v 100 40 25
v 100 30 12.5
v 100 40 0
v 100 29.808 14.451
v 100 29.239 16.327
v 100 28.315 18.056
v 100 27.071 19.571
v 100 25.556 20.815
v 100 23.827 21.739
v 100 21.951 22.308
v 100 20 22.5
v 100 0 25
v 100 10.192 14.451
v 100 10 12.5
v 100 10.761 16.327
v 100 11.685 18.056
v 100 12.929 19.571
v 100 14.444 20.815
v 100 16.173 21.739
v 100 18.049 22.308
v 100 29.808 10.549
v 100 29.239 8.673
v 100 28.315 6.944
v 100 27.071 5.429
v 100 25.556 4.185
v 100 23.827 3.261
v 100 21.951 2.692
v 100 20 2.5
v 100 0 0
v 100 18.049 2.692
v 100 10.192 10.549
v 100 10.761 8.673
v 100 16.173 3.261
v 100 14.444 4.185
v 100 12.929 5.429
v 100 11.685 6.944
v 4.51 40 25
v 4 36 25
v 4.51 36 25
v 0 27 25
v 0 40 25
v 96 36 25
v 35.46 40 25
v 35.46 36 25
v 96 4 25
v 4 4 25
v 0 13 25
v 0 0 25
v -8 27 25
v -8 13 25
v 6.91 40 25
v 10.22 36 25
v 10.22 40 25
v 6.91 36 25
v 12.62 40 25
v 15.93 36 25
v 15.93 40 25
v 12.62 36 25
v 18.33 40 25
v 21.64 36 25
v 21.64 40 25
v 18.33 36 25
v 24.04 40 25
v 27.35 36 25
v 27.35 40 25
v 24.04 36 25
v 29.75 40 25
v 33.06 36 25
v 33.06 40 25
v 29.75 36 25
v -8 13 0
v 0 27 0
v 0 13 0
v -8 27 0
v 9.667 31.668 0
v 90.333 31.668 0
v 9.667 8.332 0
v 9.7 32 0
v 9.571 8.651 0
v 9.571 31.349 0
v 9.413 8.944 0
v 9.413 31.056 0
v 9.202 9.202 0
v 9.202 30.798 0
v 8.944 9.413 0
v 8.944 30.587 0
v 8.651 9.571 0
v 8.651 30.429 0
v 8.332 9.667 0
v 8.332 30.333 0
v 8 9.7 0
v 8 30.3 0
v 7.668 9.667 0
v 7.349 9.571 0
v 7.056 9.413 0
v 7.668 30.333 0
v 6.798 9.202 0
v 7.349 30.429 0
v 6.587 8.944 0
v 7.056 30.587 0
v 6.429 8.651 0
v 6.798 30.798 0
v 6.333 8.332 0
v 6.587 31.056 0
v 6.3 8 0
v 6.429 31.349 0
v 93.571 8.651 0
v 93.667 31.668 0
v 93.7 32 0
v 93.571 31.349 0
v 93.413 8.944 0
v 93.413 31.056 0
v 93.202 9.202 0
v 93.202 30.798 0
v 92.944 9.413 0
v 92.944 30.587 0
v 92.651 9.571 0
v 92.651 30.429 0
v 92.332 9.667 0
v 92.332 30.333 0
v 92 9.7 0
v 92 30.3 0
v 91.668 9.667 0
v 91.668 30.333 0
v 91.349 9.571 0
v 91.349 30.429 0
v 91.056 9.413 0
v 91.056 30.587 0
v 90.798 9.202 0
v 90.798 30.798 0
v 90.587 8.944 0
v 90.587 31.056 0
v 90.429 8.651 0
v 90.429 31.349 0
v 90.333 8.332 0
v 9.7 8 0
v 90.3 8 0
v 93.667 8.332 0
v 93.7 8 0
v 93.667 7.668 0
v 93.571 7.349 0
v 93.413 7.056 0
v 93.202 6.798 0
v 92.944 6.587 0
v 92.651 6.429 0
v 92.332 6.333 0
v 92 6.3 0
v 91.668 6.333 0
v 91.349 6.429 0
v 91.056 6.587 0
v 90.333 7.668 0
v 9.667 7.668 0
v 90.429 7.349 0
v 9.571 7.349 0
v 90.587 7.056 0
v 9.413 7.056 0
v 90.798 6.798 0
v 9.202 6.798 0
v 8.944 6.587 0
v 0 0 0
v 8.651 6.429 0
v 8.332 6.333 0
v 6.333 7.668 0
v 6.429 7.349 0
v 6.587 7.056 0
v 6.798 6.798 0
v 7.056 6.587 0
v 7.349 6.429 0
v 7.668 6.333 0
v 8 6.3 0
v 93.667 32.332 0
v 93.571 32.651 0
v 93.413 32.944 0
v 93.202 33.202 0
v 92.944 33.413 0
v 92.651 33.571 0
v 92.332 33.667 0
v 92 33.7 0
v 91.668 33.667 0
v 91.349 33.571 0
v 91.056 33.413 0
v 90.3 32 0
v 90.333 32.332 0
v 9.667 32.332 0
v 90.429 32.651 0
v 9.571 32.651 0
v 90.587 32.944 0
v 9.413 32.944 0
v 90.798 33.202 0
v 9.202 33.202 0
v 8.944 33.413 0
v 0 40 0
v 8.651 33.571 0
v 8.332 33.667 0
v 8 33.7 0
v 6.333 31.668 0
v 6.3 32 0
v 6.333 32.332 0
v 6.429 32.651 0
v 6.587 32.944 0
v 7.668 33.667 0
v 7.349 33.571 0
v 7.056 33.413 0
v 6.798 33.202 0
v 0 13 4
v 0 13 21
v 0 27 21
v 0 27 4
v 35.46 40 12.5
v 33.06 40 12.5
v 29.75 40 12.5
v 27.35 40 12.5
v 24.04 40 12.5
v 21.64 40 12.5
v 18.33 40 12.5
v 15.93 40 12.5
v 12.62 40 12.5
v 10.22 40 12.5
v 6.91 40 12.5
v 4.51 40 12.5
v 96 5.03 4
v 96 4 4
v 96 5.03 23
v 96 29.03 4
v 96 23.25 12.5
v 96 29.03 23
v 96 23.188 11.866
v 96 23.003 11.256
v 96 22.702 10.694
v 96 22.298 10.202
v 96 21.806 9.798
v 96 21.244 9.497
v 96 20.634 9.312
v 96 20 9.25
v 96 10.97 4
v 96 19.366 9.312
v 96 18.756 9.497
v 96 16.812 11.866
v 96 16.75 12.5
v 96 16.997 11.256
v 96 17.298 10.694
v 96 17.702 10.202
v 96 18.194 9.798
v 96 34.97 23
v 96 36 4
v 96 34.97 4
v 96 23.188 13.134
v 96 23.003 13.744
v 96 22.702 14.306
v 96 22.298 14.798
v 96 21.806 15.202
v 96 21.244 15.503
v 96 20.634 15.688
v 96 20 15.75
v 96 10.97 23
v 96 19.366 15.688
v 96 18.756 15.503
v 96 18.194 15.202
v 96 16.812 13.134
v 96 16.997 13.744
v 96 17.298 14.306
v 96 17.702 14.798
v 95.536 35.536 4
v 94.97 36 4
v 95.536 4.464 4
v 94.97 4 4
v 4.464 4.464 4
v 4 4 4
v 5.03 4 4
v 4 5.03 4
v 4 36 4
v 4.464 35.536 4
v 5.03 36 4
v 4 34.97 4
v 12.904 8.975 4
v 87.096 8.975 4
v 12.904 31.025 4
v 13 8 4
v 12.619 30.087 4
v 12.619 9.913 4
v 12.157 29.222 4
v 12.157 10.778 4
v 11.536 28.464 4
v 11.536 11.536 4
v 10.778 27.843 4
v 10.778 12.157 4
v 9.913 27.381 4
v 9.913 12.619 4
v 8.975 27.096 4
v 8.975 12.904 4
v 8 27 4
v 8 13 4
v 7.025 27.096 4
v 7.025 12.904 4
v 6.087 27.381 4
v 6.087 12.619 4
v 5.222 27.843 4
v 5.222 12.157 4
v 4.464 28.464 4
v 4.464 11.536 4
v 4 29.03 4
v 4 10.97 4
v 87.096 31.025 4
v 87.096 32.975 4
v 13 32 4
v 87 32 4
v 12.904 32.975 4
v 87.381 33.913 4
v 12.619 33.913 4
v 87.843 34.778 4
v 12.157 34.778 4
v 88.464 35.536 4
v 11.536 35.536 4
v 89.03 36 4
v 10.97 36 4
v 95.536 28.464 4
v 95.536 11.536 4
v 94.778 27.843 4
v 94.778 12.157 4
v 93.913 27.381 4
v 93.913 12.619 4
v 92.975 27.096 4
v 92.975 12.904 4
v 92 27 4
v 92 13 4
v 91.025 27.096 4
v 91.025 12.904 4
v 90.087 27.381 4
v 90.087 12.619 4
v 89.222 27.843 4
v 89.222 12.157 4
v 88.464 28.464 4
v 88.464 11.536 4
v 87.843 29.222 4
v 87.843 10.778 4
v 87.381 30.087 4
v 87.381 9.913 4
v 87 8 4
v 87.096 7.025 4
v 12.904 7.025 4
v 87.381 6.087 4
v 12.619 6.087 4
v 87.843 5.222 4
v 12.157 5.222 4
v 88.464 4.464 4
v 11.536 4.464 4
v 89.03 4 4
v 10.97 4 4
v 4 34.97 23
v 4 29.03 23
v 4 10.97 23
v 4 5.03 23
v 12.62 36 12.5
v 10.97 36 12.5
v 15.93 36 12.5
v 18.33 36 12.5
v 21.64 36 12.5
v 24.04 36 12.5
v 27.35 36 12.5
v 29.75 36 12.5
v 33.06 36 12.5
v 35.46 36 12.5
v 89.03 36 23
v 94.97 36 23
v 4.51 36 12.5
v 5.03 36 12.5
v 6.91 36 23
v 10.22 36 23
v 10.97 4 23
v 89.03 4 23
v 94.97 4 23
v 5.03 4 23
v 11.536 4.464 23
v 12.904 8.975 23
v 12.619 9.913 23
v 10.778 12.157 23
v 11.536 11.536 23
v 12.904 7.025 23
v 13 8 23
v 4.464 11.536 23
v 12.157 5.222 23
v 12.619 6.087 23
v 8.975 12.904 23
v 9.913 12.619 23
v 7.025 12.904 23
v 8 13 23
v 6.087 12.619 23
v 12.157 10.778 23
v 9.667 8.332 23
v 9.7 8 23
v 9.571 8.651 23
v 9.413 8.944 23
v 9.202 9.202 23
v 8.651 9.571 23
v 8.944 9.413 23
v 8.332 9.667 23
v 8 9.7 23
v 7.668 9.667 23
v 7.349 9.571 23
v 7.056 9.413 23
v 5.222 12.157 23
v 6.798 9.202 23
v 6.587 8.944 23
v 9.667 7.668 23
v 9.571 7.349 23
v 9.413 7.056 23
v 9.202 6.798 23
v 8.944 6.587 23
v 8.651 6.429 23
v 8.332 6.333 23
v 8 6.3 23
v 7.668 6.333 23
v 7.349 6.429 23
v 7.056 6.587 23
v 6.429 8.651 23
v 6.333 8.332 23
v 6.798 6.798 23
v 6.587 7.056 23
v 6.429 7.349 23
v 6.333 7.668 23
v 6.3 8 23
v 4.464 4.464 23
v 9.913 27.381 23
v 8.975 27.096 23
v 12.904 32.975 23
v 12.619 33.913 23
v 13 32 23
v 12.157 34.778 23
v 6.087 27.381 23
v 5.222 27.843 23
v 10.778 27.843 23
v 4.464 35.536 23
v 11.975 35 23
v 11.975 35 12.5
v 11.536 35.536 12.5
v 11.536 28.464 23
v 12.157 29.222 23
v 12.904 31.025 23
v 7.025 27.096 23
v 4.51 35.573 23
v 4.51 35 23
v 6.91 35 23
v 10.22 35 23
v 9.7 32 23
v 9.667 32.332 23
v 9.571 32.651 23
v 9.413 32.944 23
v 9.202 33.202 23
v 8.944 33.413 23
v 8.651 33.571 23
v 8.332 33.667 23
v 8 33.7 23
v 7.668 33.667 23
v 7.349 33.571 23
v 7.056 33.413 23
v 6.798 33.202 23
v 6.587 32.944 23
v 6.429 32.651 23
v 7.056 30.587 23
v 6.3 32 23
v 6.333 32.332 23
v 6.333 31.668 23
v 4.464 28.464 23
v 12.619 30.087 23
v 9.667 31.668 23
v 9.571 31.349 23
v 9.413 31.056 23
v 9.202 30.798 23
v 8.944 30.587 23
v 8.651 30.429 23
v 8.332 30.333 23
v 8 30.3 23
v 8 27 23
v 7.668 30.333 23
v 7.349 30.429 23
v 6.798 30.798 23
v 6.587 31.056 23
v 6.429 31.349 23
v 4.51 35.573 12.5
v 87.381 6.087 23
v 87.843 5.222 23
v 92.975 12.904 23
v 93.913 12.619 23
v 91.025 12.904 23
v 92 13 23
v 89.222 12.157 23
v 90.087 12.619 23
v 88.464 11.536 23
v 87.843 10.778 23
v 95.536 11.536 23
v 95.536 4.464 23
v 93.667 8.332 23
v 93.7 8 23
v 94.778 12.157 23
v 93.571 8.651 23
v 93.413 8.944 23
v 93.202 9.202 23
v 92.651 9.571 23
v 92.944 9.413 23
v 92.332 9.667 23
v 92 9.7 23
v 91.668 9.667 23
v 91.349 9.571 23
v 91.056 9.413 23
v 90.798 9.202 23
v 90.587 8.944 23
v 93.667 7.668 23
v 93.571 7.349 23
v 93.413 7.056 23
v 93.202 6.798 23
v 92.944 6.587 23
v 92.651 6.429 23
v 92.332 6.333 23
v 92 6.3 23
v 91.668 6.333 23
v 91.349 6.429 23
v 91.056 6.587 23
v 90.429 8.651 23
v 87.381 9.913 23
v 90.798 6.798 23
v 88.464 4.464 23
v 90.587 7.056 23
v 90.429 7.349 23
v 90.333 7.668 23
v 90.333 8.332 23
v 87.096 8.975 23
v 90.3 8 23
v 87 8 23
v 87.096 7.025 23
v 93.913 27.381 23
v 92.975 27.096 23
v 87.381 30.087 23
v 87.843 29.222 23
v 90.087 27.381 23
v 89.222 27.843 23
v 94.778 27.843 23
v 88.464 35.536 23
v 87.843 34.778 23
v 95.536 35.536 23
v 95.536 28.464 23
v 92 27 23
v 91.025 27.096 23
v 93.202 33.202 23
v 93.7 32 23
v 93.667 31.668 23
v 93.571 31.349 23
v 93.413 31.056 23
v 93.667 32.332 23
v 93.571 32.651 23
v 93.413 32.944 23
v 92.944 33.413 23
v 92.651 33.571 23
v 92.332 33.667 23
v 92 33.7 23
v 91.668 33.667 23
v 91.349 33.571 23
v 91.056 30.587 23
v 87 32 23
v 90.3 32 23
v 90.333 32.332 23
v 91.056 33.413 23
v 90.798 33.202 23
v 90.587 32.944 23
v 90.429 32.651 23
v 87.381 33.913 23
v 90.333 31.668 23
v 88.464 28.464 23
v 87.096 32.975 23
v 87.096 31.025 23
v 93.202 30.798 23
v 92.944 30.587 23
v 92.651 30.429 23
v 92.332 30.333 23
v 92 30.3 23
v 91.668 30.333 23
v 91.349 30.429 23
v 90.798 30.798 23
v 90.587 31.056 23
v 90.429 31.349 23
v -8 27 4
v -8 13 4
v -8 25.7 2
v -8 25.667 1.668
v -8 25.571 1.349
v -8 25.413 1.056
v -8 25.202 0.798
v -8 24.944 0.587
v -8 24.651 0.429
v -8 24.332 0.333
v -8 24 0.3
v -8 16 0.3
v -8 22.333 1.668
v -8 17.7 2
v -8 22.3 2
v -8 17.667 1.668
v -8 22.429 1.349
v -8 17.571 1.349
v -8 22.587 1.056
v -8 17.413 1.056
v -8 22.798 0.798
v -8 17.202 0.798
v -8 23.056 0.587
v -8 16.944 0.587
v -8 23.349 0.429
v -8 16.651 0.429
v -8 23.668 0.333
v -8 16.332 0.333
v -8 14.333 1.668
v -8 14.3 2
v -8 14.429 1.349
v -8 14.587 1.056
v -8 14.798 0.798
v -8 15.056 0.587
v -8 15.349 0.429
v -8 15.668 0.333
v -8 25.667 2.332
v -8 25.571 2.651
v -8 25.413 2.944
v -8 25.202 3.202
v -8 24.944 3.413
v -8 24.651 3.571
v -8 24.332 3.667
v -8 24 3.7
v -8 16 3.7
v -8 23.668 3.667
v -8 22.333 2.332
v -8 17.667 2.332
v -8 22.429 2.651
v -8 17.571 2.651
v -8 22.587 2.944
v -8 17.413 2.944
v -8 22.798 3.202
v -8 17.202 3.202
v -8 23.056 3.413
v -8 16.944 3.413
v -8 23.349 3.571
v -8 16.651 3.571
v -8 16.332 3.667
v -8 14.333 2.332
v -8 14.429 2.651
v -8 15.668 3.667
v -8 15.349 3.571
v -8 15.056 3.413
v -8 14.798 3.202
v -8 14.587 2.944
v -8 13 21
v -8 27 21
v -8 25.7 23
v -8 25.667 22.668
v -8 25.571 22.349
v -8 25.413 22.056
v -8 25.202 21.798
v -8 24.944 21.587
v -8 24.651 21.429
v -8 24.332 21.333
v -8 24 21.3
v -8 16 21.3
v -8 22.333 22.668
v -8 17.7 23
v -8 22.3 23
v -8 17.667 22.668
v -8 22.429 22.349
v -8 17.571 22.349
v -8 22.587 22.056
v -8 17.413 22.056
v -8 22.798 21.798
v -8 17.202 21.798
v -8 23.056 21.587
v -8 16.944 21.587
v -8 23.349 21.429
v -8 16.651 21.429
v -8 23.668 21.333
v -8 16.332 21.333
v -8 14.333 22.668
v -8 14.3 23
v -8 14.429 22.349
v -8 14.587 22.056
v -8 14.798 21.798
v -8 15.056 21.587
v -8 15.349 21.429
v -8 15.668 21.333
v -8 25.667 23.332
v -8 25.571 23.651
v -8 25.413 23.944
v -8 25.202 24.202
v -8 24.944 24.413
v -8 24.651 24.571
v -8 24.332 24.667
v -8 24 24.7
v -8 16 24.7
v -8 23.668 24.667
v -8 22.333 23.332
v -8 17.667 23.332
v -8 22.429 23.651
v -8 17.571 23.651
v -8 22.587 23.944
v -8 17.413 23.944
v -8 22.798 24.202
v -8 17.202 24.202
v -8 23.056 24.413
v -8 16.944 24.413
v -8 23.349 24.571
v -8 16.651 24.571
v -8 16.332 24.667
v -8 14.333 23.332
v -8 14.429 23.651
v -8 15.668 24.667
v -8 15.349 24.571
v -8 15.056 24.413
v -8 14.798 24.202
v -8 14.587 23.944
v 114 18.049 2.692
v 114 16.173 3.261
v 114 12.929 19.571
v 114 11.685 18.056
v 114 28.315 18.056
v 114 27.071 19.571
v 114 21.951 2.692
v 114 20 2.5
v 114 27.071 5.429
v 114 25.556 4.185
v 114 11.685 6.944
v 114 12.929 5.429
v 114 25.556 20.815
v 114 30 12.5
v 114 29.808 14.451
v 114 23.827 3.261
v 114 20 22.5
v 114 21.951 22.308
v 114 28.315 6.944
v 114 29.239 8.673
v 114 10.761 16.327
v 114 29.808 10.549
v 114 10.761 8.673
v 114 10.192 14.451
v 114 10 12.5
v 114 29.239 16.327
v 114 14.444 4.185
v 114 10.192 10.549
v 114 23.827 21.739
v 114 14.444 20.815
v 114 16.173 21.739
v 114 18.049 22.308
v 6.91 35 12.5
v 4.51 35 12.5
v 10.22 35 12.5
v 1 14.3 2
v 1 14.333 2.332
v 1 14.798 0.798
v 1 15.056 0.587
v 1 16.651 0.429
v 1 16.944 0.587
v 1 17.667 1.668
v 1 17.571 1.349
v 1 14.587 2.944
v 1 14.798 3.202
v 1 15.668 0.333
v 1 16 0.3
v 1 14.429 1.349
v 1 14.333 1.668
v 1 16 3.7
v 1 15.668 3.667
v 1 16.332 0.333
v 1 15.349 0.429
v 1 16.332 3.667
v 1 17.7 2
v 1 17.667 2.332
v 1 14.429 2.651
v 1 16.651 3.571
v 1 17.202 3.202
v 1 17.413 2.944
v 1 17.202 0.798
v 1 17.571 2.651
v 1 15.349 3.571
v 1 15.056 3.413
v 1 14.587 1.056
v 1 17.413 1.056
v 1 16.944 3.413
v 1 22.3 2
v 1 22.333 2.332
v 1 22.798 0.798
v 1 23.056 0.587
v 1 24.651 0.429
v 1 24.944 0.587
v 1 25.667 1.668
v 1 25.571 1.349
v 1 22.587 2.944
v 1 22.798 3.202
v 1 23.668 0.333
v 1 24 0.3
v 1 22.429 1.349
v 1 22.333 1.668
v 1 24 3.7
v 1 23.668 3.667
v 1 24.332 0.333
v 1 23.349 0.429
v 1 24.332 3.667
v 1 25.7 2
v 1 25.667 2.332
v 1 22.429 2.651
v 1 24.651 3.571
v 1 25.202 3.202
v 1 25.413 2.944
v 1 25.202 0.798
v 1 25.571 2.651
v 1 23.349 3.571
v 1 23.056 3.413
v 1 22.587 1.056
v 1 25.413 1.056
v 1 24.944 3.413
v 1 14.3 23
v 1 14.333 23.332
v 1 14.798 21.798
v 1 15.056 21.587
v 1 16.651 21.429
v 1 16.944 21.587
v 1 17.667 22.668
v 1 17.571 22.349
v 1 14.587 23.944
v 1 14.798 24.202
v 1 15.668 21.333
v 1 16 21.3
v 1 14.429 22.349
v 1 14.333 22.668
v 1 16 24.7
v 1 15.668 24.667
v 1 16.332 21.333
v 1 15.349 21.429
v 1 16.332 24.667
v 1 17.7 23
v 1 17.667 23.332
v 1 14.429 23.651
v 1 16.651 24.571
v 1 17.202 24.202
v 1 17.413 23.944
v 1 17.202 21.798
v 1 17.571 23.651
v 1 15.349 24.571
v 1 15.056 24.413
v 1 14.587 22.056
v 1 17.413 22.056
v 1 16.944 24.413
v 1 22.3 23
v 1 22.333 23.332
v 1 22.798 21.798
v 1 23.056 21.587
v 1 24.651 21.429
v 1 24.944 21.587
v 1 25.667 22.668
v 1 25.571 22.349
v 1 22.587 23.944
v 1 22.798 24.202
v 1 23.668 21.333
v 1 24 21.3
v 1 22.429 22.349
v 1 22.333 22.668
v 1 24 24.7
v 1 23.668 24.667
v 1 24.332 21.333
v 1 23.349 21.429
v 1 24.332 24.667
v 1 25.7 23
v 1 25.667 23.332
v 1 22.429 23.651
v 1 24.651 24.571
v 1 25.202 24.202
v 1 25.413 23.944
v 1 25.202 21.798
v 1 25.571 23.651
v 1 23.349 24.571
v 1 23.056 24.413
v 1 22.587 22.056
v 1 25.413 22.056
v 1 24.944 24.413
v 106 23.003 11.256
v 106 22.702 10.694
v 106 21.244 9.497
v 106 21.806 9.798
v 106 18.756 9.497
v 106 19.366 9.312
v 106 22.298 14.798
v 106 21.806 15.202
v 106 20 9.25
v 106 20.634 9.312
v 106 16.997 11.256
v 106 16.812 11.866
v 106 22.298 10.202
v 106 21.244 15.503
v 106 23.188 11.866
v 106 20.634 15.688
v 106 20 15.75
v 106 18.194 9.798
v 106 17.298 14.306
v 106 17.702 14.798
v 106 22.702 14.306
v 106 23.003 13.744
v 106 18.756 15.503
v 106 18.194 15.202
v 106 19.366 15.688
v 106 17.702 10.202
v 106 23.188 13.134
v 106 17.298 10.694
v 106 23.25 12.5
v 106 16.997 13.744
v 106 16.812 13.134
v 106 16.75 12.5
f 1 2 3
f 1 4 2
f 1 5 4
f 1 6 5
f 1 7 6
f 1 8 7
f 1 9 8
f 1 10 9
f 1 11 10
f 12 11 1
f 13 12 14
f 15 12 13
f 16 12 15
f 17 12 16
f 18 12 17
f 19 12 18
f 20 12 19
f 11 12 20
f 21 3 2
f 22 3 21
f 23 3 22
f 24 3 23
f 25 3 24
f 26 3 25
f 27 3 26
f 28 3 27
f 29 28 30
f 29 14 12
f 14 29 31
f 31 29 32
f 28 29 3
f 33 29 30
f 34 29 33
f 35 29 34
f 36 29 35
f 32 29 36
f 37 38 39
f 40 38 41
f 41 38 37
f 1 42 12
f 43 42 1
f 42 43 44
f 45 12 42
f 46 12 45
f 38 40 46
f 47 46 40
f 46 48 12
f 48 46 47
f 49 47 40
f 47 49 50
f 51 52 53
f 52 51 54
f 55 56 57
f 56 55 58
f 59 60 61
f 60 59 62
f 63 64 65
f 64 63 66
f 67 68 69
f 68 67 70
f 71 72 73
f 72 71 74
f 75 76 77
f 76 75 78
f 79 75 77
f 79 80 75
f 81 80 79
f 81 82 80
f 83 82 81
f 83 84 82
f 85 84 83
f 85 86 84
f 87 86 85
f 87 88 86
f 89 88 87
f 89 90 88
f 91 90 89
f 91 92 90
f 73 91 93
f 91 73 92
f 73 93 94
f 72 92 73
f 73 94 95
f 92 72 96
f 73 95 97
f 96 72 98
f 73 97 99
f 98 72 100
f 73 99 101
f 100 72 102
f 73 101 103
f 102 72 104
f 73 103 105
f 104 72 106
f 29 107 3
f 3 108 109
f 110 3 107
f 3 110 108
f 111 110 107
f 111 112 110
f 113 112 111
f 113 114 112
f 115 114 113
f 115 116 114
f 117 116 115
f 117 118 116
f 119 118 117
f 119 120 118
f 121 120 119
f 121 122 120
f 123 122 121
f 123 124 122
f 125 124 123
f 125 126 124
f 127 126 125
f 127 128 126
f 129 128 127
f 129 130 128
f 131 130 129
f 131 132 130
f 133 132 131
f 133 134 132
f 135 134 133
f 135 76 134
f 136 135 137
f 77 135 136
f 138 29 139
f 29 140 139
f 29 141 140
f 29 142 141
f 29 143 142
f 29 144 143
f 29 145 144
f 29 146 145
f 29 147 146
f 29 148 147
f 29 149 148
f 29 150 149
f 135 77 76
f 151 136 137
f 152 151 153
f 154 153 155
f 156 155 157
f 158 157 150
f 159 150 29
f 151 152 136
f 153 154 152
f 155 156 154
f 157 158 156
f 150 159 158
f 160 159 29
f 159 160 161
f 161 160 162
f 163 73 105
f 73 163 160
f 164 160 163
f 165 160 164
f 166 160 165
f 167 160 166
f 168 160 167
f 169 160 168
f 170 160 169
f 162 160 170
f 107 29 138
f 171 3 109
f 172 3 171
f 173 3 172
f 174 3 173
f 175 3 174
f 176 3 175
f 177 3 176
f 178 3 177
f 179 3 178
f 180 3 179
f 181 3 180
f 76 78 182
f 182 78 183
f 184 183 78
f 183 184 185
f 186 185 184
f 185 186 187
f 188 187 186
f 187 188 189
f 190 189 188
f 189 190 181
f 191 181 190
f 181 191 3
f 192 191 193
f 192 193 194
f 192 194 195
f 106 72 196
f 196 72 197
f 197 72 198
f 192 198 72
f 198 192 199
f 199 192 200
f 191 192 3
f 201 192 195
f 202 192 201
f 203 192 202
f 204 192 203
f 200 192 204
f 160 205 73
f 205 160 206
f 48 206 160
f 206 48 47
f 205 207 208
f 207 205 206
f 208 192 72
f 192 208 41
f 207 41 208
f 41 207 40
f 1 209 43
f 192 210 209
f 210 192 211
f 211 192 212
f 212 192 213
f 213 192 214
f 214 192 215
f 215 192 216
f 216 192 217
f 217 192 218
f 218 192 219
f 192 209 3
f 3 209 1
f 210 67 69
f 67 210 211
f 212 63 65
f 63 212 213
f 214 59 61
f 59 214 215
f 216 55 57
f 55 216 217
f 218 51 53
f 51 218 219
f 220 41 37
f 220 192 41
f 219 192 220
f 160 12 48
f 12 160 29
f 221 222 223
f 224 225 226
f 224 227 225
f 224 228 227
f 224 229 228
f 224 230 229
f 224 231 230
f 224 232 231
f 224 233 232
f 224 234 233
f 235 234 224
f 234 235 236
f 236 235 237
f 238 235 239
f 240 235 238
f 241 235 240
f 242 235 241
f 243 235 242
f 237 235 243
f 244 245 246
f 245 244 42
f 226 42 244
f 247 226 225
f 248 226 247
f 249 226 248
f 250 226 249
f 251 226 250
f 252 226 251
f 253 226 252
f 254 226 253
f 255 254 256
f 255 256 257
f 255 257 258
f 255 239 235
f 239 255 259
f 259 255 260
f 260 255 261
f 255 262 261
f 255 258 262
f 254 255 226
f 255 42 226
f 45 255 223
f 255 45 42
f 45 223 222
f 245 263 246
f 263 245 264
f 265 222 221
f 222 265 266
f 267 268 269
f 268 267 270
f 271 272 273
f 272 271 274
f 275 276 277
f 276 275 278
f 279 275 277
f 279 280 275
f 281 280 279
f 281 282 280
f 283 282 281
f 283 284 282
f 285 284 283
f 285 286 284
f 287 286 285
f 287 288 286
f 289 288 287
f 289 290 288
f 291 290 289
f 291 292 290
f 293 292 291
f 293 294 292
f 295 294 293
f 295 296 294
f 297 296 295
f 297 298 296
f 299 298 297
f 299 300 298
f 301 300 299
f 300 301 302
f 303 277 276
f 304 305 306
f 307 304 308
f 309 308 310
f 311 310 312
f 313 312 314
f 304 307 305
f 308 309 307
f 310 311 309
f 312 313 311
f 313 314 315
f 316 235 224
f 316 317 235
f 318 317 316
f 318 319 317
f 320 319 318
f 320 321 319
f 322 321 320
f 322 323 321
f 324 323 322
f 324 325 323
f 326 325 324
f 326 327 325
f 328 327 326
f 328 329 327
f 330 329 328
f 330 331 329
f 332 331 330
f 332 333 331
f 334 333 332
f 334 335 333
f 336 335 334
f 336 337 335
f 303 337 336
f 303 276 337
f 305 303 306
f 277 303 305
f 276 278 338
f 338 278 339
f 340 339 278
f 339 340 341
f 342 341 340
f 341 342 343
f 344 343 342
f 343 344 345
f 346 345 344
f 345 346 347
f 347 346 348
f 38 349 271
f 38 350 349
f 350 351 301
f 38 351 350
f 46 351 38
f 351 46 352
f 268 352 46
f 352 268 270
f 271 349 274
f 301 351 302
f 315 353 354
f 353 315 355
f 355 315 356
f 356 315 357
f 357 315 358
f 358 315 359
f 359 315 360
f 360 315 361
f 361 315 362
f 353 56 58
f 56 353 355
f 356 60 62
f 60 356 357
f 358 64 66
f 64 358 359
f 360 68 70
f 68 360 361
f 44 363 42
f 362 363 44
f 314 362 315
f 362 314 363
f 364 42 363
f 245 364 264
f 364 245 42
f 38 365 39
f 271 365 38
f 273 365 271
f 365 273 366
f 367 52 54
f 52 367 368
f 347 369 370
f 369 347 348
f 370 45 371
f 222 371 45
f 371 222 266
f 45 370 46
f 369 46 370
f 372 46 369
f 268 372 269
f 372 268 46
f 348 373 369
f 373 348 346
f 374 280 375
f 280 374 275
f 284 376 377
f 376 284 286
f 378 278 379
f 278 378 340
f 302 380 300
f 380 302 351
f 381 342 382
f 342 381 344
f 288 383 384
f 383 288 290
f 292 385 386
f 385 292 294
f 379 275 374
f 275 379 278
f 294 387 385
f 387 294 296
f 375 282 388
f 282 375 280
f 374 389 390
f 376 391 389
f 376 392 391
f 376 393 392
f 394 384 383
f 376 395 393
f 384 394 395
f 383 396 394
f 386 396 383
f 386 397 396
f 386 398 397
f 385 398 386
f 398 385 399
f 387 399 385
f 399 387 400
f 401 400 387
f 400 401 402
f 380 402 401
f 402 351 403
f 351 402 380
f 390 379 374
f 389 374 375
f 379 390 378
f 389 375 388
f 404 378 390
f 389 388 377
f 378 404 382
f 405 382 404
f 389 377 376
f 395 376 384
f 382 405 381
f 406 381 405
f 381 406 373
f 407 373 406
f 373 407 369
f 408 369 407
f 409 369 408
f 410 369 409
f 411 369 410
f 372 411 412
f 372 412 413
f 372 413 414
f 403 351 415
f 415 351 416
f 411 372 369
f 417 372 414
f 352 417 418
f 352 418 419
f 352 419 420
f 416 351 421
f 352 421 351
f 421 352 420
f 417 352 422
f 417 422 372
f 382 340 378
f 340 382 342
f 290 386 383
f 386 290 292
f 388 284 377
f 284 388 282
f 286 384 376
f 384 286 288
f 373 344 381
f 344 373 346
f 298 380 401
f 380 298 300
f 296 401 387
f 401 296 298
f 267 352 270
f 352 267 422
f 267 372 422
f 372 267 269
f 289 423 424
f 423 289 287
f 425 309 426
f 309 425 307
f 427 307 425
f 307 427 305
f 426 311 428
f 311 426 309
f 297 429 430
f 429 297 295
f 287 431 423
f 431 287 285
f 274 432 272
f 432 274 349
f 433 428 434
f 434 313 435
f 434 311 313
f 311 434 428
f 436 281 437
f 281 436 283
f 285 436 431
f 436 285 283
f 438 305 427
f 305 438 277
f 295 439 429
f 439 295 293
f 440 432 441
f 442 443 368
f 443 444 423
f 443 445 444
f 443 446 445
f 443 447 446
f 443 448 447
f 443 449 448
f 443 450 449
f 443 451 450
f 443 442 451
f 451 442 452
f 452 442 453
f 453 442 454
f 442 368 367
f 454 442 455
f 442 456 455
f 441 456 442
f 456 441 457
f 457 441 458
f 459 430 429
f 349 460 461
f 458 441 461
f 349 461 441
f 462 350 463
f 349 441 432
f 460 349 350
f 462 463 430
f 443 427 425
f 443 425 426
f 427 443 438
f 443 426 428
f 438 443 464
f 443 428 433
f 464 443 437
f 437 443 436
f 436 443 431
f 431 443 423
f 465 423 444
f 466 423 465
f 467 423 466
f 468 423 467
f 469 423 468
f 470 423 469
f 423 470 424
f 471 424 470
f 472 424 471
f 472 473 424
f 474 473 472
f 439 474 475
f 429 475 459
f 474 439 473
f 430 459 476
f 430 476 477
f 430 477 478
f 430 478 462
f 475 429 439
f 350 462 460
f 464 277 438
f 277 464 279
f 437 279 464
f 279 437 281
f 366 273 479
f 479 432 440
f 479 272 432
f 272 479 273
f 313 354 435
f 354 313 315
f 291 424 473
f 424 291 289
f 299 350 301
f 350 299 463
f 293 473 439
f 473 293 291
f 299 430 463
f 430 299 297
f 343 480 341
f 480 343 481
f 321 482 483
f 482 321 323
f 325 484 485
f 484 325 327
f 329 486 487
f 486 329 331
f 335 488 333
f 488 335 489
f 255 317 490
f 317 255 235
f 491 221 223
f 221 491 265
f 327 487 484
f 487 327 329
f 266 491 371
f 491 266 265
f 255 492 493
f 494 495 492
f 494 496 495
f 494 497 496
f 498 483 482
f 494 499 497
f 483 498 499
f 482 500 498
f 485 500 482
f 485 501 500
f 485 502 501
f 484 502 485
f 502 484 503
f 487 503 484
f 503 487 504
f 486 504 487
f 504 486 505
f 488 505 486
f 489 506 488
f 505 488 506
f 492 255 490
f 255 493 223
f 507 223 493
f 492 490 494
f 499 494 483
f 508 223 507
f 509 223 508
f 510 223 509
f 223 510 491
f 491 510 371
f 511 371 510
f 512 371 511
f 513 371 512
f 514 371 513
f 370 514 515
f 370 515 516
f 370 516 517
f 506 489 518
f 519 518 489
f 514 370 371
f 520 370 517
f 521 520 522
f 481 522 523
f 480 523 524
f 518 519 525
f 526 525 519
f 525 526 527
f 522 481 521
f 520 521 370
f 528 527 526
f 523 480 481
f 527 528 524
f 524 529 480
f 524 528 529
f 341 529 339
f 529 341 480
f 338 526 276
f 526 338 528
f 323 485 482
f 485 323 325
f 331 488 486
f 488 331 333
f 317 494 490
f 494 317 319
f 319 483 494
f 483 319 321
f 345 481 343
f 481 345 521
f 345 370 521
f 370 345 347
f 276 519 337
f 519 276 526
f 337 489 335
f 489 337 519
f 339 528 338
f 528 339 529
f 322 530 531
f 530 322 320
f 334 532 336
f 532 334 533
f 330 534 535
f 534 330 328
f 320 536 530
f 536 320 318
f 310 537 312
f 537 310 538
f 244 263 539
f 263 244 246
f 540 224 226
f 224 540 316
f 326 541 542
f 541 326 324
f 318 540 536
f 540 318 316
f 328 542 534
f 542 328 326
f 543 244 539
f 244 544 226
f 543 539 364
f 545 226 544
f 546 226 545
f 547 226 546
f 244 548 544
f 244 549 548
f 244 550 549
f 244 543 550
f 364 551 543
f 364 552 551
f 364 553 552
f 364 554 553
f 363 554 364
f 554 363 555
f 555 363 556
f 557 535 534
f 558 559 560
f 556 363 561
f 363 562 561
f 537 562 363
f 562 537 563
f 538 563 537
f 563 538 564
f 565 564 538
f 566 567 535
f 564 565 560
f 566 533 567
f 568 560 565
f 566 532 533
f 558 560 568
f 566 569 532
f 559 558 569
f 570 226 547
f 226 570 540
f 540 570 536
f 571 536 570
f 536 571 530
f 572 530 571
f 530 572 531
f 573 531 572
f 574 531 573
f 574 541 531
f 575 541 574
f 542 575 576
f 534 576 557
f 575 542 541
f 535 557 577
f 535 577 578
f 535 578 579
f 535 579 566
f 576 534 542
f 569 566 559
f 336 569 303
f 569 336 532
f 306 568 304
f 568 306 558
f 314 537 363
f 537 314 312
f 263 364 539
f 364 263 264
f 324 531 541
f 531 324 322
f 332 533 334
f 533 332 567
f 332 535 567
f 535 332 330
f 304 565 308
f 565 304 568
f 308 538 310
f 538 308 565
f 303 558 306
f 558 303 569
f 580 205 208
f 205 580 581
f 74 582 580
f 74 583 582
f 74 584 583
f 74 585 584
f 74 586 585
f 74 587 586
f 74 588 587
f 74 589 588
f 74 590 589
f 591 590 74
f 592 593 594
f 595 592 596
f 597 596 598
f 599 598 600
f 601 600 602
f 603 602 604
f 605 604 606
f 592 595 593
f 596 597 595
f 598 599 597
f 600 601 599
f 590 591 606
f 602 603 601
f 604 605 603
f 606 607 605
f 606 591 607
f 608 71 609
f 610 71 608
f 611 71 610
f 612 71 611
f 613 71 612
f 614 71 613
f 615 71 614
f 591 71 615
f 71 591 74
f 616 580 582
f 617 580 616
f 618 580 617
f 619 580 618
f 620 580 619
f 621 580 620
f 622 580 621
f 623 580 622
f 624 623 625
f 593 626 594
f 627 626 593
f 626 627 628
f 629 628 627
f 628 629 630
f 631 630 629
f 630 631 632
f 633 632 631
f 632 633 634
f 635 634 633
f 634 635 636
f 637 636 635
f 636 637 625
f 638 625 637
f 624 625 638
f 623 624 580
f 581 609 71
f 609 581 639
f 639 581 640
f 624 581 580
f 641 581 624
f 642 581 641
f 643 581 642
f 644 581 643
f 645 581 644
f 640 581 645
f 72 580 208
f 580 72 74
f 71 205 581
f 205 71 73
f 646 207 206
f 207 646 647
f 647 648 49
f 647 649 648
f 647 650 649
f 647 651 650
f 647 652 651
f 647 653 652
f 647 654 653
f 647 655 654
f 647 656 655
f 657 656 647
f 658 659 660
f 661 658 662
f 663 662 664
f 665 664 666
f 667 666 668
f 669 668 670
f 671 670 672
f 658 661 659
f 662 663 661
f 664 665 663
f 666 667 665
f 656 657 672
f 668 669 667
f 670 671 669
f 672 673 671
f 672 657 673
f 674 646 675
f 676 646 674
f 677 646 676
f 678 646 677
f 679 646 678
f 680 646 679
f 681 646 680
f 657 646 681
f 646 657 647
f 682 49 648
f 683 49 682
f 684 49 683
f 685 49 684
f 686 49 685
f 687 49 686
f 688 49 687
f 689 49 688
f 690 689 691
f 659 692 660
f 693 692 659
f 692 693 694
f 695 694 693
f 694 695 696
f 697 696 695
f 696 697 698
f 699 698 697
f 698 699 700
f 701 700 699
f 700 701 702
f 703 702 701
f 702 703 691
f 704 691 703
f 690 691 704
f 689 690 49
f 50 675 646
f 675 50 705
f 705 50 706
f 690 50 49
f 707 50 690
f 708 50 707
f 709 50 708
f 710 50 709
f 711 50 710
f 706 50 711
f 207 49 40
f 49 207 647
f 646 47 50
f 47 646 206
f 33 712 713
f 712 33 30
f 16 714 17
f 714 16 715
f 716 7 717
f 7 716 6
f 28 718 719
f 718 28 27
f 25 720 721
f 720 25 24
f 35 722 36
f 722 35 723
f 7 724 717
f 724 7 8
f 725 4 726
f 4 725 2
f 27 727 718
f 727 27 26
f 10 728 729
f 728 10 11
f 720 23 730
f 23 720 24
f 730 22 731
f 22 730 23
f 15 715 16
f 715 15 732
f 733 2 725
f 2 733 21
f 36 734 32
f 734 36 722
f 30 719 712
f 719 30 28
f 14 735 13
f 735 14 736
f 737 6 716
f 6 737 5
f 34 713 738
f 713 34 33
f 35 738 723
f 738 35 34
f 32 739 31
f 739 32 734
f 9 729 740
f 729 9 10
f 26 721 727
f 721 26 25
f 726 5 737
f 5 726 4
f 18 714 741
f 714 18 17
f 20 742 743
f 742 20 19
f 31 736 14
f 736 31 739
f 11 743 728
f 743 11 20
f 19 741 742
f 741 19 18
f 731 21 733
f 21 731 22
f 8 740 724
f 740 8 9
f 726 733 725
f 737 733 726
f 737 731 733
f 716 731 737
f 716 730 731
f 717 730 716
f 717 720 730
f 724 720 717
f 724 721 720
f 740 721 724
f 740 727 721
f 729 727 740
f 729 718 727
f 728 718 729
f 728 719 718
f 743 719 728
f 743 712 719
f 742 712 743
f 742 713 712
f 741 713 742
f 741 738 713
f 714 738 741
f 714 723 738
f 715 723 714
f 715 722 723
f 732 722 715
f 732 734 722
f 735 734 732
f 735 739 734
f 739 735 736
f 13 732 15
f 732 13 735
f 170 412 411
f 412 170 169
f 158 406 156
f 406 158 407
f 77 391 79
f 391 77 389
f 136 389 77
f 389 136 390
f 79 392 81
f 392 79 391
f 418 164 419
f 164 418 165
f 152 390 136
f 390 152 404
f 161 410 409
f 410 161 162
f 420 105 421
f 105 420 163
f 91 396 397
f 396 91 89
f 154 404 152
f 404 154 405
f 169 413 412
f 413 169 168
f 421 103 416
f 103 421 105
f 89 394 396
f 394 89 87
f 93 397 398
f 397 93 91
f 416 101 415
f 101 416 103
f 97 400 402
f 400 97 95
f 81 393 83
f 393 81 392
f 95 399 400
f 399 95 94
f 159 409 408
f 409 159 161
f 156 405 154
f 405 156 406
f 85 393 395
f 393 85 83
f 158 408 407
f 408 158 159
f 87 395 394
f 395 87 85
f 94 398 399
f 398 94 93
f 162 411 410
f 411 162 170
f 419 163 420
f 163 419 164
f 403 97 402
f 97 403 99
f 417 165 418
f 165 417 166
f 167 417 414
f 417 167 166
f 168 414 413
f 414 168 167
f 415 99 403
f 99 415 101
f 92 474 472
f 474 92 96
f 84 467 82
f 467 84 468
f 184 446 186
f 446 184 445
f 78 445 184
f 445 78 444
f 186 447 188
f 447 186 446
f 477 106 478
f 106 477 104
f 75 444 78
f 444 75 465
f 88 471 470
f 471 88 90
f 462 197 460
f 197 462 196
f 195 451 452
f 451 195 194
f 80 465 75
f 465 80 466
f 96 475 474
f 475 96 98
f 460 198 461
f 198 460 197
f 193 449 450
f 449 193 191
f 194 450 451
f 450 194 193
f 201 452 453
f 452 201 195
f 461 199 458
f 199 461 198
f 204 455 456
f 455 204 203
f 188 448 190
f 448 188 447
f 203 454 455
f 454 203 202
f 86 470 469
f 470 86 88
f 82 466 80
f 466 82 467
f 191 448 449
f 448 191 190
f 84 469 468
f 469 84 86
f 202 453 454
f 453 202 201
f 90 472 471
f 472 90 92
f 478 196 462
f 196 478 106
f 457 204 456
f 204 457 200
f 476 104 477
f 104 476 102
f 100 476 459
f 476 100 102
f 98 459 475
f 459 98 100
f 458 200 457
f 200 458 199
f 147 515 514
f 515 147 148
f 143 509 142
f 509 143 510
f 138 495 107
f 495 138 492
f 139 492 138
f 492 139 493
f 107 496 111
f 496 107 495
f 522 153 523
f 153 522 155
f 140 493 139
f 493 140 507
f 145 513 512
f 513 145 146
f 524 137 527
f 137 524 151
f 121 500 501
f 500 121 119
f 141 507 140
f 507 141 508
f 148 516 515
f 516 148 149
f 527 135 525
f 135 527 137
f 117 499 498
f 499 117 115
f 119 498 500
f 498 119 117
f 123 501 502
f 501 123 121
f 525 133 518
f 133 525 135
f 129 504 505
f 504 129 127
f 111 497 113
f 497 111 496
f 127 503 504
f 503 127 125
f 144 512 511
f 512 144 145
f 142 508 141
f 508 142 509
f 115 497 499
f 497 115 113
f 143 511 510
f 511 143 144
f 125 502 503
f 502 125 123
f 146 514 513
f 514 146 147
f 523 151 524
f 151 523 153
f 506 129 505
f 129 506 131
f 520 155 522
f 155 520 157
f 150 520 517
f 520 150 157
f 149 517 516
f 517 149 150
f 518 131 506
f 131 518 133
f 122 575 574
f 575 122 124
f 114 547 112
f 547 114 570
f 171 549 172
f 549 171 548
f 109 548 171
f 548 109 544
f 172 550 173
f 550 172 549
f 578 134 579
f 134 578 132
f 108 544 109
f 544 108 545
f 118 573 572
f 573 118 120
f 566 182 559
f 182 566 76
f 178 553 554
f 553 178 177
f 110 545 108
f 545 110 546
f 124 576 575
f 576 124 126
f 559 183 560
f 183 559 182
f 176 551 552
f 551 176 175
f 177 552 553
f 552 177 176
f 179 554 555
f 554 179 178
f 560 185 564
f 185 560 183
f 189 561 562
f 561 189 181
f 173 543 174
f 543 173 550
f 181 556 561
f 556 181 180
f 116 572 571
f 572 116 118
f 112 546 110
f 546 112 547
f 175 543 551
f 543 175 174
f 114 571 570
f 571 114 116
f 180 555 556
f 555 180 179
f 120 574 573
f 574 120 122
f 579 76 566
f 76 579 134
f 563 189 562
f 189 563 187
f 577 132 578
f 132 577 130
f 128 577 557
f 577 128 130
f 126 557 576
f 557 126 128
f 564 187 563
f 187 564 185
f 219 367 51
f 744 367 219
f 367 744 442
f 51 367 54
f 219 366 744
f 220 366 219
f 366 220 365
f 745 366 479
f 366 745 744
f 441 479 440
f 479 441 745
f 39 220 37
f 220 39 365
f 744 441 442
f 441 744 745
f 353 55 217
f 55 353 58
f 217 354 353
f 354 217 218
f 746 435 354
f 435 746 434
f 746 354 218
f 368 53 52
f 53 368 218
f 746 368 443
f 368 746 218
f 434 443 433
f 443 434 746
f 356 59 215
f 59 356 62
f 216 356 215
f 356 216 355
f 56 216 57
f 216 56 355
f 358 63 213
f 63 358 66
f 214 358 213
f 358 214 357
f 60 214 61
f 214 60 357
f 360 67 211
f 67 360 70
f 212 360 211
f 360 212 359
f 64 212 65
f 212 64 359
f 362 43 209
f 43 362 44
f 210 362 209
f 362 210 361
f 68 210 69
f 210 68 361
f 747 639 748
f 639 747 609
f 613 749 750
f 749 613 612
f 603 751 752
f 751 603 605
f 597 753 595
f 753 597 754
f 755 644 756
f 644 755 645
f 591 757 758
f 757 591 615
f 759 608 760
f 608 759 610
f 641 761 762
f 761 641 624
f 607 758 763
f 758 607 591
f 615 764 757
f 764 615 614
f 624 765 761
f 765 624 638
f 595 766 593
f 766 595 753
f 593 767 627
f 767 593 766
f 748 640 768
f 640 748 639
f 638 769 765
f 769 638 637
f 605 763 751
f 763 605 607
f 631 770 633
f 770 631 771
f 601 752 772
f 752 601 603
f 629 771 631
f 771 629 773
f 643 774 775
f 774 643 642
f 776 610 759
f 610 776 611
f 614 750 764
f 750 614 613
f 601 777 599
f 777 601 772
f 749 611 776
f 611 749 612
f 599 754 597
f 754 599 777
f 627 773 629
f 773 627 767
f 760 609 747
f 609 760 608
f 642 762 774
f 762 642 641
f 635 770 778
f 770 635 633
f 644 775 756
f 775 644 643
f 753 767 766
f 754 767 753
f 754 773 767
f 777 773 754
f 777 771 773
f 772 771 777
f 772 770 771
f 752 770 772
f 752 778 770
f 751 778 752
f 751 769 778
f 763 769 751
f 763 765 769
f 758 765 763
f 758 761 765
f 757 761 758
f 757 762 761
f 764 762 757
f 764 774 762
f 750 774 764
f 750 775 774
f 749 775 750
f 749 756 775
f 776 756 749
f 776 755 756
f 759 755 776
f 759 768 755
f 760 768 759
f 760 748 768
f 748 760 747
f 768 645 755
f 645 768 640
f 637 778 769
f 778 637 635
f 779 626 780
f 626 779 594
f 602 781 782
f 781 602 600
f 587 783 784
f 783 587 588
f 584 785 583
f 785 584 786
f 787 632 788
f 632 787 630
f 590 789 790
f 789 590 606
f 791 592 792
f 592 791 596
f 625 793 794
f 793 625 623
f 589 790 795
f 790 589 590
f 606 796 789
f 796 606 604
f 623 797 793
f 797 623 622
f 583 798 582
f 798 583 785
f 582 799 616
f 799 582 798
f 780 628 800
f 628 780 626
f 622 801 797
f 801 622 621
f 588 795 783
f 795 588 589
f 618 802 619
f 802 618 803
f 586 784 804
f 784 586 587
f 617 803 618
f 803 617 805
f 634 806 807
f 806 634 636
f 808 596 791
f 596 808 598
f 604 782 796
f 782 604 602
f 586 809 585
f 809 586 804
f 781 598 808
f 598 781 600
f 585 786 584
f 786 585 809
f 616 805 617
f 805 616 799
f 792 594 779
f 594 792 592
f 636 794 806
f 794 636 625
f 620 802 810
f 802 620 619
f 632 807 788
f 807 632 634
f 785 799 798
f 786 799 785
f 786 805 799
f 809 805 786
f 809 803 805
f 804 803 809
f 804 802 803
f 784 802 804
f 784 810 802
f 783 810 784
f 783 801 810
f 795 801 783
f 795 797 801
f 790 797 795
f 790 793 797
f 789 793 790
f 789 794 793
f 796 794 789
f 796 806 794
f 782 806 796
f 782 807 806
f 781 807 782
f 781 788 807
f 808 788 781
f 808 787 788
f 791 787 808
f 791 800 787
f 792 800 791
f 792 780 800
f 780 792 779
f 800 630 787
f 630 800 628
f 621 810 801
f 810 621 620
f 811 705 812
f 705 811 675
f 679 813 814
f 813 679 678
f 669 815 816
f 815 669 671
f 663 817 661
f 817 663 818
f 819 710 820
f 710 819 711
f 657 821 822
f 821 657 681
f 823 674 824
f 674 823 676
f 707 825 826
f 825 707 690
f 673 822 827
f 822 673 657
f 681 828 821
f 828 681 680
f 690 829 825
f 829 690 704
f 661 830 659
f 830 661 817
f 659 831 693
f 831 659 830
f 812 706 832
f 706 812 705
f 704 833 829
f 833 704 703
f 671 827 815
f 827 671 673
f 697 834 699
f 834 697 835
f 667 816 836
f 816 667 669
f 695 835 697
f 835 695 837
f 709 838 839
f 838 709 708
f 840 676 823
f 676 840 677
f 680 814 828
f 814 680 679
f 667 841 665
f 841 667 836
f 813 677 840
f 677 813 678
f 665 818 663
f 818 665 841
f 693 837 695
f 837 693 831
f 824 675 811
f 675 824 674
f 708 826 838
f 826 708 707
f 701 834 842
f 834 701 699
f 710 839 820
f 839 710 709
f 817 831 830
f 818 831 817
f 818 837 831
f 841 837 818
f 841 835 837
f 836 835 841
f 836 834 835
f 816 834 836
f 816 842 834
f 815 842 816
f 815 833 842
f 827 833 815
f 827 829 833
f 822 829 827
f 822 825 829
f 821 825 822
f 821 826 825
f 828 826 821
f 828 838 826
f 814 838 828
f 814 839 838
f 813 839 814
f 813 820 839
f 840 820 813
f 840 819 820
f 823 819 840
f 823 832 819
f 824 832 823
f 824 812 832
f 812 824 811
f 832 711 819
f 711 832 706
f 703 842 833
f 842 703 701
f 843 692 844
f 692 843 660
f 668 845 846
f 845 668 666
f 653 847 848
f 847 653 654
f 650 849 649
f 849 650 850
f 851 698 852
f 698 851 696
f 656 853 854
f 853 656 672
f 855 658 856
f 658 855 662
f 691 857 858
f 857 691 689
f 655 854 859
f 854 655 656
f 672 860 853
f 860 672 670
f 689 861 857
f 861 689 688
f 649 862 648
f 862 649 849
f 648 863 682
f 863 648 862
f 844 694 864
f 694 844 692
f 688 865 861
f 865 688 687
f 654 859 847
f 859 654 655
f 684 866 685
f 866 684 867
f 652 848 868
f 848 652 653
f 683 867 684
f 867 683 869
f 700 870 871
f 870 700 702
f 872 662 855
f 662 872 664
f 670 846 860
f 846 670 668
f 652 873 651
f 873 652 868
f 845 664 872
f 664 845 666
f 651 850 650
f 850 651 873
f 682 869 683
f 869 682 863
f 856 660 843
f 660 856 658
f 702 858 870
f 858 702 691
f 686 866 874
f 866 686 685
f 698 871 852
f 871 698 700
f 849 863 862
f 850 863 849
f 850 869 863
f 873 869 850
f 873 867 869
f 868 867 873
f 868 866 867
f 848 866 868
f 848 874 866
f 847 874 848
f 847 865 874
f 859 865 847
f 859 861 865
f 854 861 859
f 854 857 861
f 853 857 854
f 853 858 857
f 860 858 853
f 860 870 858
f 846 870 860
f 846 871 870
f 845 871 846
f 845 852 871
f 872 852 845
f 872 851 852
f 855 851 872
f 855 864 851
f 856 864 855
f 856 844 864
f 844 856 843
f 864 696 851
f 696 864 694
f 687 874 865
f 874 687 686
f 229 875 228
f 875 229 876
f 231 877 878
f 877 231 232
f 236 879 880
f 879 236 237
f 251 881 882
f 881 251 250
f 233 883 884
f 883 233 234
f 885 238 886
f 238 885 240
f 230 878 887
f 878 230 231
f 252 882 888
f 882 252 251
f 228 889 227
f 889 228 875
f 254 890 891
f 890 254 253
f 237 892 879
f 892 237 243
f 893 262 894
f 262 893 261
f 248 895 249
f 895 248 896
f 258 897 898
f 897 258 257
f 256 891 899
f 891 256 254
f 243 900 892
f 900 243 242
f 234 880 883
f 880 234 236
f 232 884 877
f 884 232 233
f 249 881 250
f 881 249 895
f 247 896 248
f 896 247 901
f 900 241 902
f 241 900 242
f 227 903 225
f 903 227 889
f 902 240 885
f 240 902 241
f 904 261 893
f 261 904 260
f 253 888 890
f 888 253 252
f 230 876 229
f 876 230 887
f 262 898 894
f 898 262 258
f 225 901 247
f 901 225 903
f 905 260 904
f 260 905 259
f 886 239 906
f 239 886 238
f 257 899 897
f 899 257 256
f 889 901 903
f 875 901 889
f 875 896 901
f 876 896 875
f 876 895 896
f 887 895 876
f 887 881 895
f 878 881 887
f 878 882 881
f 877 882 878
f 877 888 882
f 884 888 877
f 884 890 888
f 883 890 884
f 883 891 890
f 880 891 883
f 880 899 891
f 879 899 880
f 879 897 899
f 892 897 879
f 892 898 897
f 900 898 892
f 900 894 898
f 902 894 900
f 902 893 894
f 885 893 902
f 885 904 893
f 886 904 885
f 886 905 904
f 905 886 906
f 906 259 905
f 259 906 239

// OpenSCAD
$fn = 32;

// ----------------------------------------------------------------------
// Enclosure body: 100 x 40 x 25 mm, wall 4 mm
// ----------------------------------------------------------------------

// --- parameters (mm) ---
length = 100;             // outside length, X
width = 40;               // outside width, Y
height = 25;              // outside height, Z
wall = 4;                 // side wall thickness
floor_t = 4;              // floor thickness
boss_d = 10;              // corner boss diameter
boss_h = 19;              // corner boss height above the floor
boss_hole_d = 3.4;        // lid screw clearance in the boss
boss_lip = 8;             // boss centre inset from the corner
ear_w = 14;               // mounting ear width
ear_t = 4;                // mounting ear thickness
ear_ext = 8;              // mounting ear reach
ear_hole_d = 3.4;         // mounting ear drills
vent_slots = 6;           // vent slots in the long wall
vent_w = 2.4;             // vent slot width
vent_h = 16;              // vent slot height
vent_pitch = 5.71;        // vent slot pitch
vent_z = 12.5;            // vent slot sill height
nipple_d = 20;            // cable gland boss diameter
nipple_h = 14;            // cable gland boss height
nipple_bore = 6.5;        // cable gland bore

module shell() {
  difference() {
    cube([length, width, height]);
    /* hollow, open at the top */
    translate([wall, wall, floor_t])
      cube([length - 2 * wall, width - 2 * wall, height]);
  }
}

module bosses() {
  /* corner bosses, sunk 1 mm into the floor */
  for (sx = [0, 1]) for (sy = [0, 1])
    translate([sx * (length - 2 * boss_lip) + boss_lip, sy * (width - 2 * boss_lip) + boss_lip, floor_t - 1])
      cylinder(h = boss_h + 1, d = boss_d);
}

module gland() {
  /* boss on the short wall, sunk 1 mm into it */
  translate([length - 1, width / 2, height * 0.5]) rotate([0, 90, 0])
    cylinder(h = nipple_h + 1, d = nipple_d);
}

module ears() {
  /* mounting ears on the short walls, sunk into the wall */
  for (sz = [0, 1])
    translate([-ear_ext, width / 2 - ear_w / 2, sz * (height - ear_t)])
      cube([ear_ext + 2.5, ear_w, ear_t]);
}

difference() {
  union() {
    shell();
    bosses();
    gland();
    ears();
  }
  /* boss screw holes */
  for (sx = [0, 1]) for (sy = [0, 1])
    translate([sx * (length - 2 * boss_lip) + boss_lip, sy * (width - 2 * boss_lip) + boss_lip, -1]) cylinder(h = floor_t + boss_h + 2, d = boss_hole_d);
  /* vent grille in the +Y wall */
  for (i = [0 : vent_slots - 1]) translate([vent_pitch * (i + 1) - vent_w / 2, width - wall - 1, vent_z]) cube([vent_w, wall + 2, vent_h]);
  translate([length, width / 2, height * 0.5]) rotate([0, 90, 0]) translate([0, 0, -nipple_h - 2]) cylinder(h = nipple_h + wall + 4, d = nipple_bore);
  for (sz = [0, 1]) for (sx = [0, 1]) translate([-ear_ext - 1, width / 2 + (2 * sx - 1) * (ear_w / 2 - 3), sz * (height - ear_t) + ear_t / 2]) rotate([0, 90, 0]) cylinder(h = ear_ext + 2, d = ear_hole_d);
}
